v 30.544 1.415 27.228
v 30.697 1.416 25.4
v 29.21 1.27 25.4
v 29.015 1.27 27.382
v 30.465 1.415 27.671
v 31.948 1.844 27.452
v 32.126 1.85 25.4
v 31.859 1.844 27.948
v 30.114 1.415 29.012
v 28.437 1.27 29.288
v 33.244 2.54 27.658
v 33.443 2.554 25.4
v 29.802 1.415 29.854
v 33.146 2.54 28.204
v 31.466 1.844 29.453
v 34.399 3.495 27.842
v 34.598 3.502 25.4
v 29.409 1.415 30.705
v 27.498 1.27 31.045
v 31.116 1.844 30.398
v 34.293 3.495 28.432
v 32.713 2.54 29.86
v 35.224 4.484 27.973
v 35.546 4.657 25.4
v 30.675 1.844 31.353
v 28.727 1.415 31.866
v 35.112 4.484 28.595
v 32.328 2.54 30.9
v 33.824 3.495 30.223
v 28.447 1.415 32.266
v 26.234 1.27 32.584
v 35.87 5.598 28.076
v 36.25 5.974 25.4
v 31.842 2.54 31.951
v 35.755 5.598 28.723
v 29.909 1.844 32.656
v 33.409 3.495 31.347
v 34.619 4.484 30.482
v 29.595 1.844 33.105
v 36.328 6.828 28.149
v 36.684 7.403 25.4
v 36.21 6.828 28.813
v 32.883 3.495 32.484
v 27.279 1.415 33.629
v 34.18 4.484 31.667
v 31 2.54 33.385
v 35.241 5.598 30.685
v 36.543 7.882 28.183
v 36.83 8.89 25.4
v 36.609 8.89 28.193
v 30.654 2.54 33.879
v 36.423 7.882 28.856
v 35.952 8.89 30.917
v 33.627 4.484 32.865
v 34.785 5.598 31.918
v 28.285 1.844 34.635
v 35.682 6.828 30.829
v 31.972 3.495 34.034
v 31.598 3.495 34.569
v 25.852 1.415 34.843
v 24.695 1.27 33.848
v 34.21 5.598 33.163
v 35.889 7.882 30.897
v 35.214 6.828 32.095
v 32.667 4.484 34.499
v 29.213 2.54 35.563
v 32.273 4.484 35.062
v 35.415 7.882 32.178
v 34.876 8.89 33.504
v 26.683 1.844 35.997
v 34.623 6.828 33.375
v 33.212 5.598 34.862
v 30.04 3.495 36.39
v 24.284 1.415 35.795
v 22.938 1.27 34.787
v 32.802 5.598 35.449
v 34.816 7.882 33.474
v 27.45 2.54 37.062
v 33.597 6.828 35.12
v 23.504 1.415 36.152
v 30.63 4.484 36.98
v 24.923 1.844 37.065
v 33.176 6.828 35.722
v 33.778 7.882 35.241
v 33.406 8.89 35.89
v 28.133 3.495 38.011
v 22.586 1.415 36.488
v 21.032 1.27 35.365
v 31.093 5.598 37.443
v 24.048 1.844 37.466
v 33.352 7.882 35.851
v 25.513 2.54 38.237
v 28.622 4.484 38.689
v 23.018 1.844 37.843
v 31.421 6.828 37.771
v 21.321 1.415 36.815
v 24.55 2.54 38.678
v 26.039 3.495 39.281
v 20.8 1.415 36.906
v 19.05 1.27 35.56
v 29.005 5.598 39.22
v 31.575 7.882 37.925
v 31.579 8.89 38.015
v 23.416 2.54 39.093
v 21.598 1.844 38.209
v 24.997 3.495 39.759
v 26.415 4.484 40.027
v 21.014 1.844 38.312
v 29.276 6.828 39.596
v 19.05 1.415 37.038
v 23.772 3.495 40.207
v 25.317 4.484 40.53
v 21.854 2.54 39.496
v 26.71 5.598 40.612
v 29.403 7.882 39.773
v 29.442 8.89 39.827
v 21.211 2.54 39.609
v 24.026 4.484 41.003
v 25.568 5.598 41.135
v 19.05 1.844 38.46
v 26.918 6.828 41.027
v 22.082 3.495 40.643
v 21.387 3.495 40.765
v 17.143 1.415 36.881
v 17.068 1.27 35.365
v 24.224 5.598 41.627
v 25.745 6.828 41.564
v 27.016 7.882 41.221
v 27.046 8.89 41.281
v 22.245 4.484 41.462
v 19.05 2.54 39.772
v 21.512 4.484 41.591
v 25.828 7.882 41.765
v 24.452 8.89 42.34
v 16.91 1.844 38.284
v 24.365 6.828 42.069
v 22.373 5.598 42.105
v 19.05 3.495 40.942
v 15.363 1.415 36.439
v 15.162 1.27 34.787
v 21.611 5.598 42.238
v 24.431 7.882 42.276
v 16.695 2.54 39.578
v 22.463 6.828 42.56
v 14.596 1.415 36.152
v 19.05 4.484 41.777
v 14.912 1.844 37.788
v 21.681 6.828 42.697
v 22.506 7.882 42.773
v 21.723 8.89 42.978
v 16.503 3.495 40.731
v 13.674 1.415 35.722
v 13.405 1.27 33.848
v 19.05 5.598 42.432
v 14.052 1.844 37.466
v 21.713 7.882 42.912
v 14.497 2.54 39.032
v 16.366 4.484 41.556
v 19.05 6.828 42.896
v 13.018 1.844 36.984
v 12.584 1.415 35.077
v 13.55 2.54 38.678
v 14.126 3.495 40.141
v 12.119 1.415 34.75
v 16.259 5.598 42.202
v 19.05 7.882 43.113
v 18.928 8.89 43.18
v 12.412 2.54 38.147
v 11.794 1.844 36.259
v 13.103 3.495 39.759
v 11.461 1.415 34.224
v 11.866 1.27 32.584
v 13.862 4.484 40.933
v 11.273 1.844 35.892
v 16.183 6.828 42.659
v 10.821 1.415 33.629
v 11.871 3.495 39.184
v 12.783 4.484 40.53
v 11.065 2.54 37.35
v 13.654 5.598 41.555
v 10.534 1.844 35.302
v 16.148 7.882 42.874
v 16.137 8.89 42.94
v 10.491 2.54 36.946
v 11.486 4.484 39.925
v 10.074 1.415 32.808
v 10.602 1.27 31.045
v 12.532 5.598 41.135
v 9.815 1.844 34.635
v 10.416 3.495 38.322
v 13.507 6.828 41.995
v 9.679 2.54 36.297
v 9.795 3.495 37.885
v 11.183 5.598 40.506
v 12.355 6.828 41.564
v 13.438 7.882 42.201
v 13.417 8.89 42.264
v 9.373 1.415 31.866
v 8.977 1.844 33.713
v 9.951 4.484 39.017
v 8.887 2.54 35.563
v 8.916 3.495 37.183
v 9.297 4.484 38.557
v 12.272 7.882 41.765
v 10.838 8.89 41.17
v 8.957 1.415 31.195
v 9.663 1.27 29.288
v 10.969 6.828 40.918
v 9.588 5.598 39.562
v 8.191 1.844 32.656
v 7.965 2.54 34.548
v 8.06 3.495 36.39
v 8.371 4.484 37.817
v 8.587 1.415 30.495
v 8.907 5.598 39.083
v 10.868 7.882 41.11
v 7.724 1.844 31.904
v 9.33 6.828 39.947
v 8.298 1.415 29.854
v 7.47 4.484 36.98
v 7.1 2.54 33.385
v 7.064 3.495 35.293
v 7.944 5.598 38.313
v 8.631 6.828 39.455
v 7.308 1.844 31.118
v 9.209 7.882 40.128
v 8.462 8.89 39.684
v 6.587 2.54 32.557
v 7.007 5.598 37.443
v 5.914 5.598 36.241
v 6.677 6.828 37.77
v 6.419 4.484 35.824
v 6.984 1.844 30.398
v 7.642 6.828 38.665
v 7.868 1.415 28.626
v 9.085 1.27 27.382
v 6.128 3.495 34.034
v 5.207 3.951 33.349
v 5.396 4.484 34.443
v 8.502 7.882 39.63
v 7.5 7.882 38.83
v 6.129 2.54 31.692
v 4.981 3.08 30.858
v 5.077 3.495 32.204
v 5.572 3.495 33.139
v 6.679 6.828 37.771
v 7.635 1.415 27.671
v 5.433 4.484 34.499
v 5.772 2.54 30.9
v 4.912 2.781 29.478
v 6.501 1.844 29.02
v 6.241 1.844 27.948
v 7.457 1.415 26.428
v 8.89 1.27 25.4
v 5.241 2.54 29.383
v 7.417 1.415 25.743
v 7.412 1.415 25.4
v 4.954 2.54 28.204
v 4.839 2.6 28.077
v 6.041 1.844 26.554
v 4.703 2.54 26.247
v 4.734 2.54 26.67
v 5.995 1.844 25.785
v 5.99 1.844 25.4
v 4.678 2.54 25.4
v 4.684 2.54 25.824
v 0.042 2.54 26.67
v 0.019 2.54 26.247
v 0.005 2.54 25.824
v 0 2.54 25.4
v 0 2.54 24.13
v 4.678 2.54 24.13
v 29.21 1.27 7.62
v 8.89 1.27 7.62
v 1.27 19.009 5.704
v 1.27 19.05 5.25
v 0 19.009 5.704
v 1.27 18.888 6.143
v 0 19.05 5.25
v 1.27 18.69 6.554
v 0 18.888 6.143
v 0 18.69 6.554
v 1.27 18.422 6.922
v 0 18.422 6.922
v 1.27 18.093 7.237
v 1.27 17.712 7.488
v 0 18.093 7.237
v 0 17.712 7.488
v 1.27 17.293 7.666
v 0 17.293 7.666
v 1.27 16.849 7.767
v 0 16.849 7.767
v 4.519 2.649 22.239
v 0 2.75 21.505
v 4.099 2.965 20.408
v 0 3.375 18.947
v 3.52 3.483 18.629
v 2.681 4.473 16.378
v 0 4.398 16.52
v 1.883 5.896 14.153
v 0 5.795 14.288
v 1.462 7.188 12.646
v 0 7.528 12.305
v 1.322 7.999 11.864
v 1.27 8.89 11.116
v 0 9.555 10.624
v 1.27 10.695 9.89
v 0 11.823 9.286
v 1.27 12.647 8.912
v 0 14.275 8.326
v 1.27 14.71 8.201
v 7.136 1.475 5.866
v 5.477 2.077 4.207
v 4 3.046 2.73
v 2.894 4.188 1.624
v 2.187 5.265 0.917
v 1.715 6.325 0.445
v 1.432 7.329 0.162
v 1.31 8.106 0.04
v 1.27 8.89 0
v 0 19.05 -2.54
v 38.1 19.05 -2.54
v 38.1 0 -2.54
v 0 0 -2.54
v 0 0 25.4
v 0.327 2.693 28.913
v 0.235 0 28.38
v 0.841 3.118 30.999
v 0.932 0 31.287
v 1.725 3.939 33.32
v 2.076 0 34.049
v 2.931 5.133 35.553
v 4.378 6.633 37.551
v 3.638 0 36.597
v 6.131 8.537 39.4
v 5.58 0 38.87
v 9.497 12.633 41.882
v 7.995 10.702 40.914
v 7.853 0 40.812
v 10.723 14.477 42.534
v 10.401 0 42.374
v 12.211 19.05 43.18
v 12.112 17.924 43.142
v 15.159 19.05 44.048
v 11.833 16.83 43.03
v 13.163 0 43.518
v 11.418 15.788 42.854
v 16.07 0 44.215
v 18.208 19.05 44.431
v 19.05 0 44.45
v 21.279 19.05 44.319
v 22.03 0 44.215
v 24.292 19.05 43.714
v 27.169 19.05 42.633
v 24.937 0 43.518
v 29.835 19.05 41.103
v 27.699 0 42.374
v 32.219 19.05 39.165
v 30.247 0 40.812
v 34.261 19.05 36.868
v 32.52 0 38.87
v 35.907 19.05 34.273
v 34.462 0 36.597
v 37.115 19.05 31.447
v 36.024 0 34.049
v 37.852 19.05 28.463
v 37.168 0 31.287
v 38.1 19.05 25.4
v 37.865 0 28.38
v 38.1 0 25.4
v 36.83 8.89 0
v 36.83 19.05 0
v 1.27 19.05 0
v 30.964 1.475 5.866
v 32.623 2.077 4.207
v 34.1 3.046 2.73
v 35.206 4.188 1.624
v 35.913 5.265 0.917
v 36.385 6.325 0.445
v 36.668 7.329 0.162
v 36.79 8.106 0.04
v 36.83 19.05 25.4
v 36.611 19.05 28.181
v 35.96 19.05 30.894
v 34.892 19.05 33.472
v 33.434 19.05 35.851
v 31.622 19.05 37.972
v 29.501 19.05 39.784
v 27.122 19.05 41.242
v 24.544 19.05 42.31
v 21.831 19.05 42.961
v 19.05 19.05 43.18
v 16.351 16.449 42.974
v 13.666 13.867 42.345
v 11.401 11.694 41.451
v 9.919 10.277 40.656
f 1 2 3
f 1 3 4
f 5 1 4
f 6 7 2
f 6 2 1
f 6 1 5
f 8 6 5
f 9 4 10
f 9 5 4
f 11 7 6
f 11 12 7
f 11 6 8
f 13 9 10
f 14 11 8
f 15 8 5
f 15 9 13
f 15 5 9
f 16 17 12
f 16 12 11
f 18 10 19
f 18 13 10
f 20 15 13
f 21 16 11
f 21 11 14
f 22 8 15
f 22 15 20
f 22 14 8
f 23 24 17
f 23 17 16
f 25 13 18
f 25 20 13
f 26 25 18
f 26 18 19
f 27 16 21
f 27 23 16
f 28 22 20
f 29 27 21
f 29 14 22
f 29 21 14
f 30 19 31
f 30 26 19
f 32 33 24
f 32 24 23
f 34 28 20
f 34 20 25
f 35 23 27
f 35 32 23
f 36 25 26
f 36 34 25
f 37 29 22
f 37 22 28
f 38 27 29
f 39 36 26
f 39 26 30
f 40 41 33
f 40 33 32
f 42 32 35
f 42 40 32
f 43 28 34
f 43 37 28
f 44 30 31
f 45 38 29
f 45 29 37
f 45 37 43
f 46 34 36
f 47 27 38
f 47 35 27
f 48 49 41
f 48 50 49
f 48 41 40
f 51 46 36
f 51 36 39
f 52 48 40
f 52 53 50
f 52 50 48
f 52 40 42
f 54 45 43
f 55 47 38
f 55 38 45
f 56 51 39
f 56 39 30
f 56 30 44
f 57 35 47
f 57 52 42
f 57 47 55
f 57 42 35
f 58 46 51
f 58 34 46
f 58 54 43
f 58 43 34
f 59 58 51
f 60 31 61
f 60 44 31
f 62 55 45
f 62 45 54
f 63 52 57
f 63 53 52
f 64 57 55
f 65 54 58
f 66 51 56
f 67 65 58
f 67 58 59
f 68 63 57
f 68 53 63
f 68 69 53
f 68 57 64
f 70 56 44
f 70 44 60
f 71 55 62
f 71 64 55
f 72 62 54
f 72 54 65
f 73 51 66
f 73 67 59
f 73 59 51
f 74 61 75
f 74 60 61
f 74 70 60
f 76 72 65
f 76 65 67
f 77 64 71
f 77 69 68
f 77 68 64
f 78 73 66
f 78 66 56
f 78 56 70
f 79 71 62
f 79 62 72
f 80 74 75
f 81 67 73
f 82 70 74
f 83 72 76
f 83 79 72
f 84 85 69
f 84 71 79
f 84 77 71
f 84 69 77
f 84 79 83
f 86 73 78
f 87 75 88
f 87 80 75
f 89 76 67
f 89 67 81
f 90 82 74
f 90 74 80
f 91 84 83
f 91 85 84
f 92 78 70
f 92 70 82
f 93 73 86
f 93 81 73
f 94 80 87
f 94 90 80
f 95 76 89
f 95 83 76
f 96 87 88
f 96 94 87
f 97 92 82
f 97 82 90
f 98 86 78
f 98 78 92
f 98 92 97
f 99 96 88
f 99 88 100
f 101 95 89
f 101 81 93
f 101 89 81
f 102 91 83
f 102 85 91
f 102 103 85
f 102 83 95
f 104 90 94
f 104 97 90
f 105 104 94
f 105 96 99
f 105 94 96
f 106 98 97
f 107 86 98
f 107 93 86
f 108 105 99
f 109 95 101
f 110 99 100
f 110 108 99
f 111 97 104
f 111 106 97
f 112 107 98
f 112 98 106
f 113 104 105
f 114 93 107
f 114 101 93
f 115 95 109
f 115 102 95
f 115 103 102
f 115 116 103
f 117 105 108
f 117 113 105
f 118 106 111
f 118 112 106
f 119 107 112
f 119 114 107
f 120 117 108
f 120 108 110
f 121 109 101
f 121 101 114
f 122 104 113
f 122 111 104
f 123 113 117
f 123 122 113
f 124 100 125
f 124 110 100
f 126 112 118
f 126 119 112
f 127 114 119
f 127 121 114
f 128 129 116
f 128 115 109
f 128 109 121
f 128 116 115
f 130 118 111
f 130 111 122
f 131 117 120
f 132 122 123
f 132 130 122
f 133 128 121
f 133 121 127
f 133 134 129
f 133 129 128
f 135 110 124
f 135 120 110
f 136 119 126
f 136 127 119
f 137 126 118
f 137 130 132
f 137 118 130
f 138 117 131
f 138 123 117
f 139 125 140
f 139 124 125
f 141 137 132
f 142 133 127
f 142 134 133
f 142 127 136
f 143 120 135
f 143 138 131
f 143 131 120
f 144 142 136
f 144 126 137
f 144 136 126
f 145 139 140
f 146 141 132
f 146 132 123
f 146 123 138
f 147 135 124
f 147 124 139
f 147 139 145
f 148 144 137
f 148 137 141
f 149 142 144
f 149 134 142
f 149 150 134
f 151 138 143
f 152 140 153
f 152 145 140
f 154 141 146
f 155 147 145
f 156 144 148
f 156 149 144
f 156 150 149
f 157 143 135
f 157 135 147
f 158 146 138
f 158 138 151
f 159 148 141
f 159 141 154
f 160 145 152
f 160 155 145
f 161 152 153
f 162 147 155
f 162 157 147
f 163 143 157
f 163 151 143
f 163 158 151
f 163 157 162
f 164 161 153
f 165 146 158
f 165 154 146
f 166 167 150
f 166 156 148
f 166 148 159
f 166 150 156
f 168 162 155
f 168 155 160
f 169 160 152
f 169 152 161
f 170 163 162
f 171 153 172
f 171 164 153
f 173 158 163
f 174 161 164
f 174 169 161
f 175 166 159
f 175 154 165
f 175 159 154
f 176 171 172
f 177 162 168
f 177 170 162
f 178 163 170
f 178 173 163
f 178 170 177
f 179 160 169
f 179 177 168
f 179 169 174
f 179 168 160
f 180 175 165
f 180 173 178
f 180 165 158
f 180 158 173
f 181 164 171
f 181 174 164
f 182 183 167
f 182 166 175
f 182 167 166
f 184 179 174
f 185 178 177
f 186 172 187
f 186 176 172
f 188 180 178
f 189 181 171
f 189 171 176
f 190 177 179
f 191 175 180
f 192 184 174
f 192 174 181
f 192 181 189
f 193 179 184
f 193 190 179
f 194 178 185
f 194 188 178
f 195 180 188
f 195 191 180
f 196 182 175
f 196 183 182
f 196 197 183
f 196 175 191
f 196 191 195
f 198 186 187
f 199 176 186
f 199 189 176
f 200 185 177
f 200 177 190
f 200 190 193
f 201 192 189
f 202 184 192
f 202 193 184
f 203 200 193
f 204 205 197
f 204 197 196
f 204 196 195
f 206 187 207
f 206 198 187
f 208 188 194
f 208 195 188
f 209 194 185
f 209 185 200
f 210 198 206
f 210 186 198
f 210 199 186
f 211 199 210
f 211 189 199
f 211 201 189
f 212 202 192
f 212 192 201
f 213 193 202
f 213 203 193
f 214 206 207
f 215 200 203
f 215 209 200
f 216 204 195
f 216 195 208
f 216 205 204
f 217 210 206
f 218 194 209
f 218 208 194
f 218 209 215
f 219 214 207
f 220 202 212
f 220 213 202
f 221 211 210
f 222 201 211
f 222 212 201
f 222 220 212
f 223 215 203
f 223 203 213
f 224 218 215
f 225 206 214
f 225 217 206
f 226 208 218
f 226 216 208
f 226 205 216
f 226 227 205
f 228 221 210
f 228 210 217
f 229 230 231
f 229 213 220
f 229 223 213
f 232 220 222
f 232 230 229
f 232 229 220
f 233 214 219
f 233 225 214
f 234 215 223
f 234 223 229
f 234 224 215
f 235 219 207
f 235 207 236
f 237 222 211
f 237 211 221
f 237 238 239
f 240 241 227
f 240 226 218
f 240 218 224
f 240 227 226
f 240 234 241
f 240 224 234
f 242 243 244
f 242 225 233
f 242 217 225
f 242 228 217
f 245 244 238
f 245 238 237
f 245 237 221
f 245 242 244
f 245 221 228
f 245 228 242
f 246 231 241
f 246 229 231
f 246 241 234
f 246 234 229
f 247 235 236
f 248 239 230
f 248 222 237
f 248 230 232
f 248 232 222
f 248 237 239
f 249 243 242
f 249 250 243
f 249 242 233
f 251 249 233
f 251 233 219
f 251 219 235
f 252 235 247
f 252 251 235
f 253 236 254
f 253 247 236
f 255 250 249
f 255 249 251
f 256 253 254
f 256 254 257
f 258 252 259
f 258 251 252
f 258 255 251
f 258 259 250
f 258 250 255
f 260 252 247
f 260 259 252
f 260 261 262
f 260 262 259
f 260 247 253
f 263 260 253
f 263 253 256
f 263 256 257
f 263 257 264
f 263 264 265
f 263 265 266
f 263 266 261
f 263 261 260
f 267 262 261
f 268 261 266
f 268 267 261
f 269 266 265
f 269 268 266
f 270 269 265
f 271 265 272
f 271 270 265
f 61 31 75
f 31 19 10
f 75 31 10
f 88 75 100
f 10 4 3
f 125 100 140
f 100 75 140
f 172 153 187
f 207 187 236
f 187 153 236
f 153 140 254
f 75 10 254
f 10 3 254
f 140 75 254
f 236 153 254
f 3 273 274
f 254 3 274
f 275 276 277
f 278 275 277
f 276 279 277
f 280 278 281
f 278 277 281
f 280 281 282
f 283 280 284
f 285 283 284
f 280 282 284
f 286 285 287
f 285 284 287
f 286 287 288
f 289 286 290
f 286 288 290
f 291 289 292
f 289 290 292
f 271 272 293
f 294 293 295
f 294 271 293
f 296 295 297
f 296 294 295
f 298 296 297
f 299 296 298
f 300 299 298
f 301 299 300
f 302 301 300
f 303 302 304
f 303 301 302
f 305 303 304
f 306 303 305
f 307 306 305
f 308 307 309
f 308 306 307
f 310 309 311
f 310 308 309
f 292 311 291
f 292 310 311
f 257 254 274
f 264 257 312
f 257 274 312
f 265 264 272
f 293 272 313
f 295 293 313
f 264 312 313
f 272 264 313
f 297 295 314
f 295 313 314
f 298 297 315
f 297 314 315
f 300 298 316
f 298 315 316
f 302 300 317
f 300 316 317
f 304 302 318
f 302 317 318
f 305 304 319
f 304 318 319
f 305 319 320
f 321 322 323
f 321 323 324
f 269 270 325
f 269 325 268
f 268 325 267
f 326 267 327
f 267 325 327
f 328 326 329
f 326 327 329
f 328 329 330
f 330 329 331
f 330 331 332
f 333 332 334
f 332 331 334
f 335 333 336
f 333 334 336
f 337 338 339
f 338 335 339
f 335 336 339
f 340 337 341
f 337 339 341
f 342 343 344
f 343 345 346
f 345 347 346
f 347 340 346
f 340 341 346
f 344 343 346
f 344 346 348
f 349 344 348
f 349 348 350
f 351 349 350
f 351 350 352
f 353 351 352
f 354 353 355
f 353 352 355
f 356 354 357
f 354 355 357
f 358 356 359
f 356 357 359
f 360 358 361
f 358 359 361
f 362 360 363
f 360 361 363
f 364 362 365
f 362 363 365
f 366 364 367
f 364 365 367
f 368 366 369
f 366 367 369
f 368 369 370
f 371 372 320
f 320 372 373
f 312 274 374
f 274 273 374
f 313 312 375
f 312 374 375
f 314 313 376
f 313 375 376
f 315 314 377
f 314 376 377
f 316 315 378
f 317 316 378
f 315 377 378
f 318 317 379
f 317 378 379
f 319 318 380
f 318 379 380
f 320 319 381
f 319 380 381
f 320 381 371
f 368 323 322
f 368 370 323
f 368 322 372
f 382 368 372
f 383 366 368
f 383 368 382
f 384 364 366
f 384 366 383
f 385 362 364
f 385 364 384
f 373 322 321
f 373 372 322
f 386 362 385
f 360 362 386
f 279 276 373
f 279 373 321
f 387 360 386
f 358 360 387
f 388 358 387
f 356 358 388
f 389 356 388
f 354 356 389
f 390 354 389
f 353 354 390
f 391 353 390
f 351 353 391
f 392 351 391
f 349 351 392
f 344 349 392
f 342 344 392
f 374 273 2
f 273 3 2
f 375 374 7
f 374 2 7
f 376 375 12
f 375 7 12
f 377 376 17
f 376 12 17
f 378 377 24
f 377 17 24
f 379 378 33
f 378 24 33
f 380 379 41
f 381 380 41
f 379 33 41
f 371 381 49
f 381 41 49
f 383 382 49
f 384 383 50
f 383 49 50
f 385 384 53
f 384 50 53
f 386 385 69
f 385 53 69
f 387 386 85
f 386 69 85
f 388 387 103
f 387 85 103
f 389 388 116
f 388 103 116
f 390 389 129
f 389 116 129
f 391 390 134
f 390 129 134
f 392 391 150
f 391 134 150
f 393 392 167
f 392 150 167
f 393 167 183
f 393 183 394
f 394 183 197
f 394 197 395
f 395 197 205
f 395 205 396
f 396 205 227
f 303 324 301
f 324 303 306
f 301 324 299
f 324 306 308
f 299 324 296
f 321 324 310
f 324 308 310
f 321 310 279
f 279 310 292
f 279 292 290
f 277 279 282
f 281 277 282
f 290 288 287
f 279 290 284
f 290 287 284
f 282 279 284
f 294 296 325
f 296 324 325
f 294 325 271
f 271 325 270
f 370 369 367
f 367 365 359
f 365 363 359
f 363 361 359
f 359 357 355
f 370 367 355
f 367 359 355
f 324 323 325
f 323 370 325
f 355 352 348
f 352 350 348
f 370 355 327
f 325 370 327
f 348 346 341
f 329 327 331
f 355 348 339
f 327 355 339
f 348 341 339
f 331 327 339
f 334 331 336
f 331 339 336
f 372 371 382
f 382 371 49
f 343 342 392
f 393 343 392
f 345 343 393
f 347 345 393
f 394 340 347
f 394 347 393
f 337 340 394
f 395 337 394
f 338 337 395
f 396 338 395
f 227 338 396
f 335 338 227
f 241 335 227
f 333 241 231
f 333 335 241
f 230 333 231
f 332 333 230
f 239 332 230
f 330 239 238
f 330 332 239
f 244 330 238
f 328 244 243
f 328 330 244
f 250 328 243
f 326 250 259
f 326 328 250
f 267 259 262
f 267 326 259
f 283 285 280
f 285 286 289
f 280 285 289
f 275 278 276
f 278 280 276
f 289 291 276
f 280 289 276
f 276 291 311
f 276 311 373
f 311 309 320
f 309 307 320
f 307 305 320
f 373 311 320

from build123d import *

# Parameters (mm, degrees)
BOSS_EXTRUDE1_DEPTH = 1.27
BOSS_EXTRUDE3_DEPTH = 17.78
SKETCH5_W           = 38.1
SKETCH5_H           = 19.05
BOSS_EXTRUDE4_DEPTH = 2.54
FILLET1_R           = 7.62
CUT_EXTRUDE5_REACH  = 40.1
FILLET3_R           = 2.54


with BuildPart() as part:
    # Sketch1 → Boss-Extrude1 (new body)
    with BuildSketch(Plane(origin=(0, 0, 0), x_dir=(1, 0, 0), z_dir=(0, 1, 0))):
        with BuildLine():
            Line((0, 0), (38.1, 0))
            Line((38.1, 0), (38.1, -25.4))
            ThreePointArc((38.1, -25.4), (19.05, -44.45), (0, -25.4))
            Line((0, -25.4), (0, 0))
        make_face()
    extrude(amount=BOSS_EXTRUDE1_DEPTH)

    # Sketch3 → Boss-Extrude3 (add)
    with BuildSketch(Plane(origin=(0, 1.27, 0), x_dir=(1, 0, 0), z_dir=(0, 1, 0))):
        with BuildLine():
            Line((0, 0), (0, -25.4))
            ThreePointArc((0, -25.4), (19.05, -44.45), (38.1, -25.4))
            Line((38.1, -25.4), (38.1, 0))
            Line((38.1, 0), (36.83, 0))
            Line((36.83, 0), (36.83, -25.4))
            ThreePointArc((36.83, -25.4), (19.05, -43.18), (1.27, -25.4))
            Line((1.27, -25.4), (1.27, 0))
            Line((1.27, 0), (0, 0))
        make_face()
    extrude(amount=BOSS_EXTRUDE3_DEPTH)

    # Sketch5 → Boss-Extrude4 (add)
    with BuildSketch(Plane(origin=(0, 0, 0), x_dir=(-1, 0, 0), z_dir=(0, 0, -1))):
        with Locations((-19.05, 9.525)):
            Rectangle(SKETCH5_W, SKETCH5_H)
    extrude(amount=BOSS_EXTRUDE4_DEPTH)

    # Fillet1
    fillet1_edges = [part.edges().sort_by_distance(p)[0] for p in [
        (19.05, 1.27, 0),
        (36.83, 1.27, 12.7),
        (19.05, 1.27, 43.18),
        (1.27, 1.27, 12.7),
    ]]
    fillet(fillet1_edges, radius=FILLET1_R)

    # Sketch9 → Cut-Extrude5 (cut, up to next)
    with BuildSketch(Plane.ZY, mode=Mode.PRIVATE) as cut_extrude5_sk1:
        with BuildLine():
            Line((24.13, 35.56), (26.67, 35.56))
            ThreePointArc((26.67, 35.56), (43.18, 19.05), (26.67, 2.54))
            Line((26.67, 2.54), (24.13, 2.54))
            ThreePointArc((24.13, 2.54), (7.62, 19.05), (24.13, 35.56))
        make_face()
    cut_extrude5_tool1 = extrude(cut_extrude5_sk1.sketch, amount=-CUT_EXTRUDE5_REACH, mode=Mode.PRIVATE) & part.part
    add(cut_extrude5_tool1.solids().sort_by_distance((0, 19.05, 25.4))[0], mode=Mode.SUBTRACT)

    # Fillet3
    fillet3_edges = [part.edges().sort_by_distance(p)[0] for p in [
        (0.635, 19.05, 7.62),
    ]]
    fillet(fillet3_edges, radius=FILLET3_R)


solid = part.part
